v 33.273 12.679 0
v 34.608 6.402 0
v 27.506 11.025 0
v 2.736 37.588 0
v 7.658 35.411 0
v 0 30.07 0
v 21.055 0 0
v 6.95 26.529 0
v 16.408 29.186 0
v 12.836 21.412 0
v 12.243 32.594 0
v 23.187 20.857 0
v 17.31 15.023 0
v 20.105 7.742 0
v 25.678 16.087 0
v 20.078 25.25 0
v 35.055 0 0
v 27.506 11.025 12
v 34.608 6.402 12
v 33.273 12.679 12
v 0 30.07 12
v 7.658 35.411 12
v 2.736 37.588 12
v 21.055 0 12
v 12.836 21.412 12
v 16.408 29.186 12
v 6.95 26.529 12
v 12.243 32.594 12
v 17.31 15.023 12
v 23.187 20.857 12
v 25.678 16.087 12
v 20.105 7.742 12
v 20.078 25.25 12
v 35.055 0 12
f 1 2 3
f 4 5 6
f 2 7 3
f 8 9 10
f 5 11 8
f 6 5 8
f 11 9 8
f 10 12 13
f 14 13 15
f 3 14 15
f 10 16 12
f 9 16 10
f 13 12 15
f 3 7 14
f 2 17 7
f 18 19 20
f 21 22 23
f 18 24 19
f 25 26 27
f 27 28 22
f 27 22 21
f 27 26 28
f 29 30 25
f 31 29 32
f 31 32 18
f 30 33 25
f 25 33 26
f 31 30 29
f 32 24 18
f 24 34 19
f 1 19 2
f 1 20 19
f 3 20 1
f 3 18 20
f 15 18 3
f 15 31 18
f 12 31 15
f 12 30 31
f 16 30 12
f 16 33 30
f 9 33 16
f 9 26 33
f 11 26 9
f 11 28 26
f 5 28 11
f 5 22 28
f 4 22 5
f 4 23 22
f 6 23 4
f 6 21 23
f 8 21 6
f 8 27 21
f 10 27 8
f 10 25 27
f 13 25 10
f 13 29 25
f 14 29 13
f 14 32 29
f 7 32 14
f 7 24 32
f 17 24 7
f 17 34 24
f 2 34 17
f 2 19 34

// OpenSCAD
$fn = 32;

// ----------------------------------------------------------------------
// Arc stop: segment, 12 mm thick
// ----------------------------------------------------------------------

// --- parameters (mm) ---
profile_height = 12;      // extrusion height
profile_points = 17;      // points of the closed outline

profile = [[35.055, 0], [34.608, 6.402], [33.273, 12.679], [27.506, 11.025], [25.678, 16.087], [23.187, 20.857], [20.078, 25.25], [16.408, 29.186], [12.243, 32.594], [7.658, 35.411], [2.736, 37.588], [0, 30.07], [6.95, 26.529], [12.836, 21.412], [17.31, 15.023], [20.105, 7.742], [21.055, 0]];  // single closed polygon, 17 points, counter clockwise

// --- the one profile operation ---
linear_extrude(height = profile_height) polygon(points = profile);
